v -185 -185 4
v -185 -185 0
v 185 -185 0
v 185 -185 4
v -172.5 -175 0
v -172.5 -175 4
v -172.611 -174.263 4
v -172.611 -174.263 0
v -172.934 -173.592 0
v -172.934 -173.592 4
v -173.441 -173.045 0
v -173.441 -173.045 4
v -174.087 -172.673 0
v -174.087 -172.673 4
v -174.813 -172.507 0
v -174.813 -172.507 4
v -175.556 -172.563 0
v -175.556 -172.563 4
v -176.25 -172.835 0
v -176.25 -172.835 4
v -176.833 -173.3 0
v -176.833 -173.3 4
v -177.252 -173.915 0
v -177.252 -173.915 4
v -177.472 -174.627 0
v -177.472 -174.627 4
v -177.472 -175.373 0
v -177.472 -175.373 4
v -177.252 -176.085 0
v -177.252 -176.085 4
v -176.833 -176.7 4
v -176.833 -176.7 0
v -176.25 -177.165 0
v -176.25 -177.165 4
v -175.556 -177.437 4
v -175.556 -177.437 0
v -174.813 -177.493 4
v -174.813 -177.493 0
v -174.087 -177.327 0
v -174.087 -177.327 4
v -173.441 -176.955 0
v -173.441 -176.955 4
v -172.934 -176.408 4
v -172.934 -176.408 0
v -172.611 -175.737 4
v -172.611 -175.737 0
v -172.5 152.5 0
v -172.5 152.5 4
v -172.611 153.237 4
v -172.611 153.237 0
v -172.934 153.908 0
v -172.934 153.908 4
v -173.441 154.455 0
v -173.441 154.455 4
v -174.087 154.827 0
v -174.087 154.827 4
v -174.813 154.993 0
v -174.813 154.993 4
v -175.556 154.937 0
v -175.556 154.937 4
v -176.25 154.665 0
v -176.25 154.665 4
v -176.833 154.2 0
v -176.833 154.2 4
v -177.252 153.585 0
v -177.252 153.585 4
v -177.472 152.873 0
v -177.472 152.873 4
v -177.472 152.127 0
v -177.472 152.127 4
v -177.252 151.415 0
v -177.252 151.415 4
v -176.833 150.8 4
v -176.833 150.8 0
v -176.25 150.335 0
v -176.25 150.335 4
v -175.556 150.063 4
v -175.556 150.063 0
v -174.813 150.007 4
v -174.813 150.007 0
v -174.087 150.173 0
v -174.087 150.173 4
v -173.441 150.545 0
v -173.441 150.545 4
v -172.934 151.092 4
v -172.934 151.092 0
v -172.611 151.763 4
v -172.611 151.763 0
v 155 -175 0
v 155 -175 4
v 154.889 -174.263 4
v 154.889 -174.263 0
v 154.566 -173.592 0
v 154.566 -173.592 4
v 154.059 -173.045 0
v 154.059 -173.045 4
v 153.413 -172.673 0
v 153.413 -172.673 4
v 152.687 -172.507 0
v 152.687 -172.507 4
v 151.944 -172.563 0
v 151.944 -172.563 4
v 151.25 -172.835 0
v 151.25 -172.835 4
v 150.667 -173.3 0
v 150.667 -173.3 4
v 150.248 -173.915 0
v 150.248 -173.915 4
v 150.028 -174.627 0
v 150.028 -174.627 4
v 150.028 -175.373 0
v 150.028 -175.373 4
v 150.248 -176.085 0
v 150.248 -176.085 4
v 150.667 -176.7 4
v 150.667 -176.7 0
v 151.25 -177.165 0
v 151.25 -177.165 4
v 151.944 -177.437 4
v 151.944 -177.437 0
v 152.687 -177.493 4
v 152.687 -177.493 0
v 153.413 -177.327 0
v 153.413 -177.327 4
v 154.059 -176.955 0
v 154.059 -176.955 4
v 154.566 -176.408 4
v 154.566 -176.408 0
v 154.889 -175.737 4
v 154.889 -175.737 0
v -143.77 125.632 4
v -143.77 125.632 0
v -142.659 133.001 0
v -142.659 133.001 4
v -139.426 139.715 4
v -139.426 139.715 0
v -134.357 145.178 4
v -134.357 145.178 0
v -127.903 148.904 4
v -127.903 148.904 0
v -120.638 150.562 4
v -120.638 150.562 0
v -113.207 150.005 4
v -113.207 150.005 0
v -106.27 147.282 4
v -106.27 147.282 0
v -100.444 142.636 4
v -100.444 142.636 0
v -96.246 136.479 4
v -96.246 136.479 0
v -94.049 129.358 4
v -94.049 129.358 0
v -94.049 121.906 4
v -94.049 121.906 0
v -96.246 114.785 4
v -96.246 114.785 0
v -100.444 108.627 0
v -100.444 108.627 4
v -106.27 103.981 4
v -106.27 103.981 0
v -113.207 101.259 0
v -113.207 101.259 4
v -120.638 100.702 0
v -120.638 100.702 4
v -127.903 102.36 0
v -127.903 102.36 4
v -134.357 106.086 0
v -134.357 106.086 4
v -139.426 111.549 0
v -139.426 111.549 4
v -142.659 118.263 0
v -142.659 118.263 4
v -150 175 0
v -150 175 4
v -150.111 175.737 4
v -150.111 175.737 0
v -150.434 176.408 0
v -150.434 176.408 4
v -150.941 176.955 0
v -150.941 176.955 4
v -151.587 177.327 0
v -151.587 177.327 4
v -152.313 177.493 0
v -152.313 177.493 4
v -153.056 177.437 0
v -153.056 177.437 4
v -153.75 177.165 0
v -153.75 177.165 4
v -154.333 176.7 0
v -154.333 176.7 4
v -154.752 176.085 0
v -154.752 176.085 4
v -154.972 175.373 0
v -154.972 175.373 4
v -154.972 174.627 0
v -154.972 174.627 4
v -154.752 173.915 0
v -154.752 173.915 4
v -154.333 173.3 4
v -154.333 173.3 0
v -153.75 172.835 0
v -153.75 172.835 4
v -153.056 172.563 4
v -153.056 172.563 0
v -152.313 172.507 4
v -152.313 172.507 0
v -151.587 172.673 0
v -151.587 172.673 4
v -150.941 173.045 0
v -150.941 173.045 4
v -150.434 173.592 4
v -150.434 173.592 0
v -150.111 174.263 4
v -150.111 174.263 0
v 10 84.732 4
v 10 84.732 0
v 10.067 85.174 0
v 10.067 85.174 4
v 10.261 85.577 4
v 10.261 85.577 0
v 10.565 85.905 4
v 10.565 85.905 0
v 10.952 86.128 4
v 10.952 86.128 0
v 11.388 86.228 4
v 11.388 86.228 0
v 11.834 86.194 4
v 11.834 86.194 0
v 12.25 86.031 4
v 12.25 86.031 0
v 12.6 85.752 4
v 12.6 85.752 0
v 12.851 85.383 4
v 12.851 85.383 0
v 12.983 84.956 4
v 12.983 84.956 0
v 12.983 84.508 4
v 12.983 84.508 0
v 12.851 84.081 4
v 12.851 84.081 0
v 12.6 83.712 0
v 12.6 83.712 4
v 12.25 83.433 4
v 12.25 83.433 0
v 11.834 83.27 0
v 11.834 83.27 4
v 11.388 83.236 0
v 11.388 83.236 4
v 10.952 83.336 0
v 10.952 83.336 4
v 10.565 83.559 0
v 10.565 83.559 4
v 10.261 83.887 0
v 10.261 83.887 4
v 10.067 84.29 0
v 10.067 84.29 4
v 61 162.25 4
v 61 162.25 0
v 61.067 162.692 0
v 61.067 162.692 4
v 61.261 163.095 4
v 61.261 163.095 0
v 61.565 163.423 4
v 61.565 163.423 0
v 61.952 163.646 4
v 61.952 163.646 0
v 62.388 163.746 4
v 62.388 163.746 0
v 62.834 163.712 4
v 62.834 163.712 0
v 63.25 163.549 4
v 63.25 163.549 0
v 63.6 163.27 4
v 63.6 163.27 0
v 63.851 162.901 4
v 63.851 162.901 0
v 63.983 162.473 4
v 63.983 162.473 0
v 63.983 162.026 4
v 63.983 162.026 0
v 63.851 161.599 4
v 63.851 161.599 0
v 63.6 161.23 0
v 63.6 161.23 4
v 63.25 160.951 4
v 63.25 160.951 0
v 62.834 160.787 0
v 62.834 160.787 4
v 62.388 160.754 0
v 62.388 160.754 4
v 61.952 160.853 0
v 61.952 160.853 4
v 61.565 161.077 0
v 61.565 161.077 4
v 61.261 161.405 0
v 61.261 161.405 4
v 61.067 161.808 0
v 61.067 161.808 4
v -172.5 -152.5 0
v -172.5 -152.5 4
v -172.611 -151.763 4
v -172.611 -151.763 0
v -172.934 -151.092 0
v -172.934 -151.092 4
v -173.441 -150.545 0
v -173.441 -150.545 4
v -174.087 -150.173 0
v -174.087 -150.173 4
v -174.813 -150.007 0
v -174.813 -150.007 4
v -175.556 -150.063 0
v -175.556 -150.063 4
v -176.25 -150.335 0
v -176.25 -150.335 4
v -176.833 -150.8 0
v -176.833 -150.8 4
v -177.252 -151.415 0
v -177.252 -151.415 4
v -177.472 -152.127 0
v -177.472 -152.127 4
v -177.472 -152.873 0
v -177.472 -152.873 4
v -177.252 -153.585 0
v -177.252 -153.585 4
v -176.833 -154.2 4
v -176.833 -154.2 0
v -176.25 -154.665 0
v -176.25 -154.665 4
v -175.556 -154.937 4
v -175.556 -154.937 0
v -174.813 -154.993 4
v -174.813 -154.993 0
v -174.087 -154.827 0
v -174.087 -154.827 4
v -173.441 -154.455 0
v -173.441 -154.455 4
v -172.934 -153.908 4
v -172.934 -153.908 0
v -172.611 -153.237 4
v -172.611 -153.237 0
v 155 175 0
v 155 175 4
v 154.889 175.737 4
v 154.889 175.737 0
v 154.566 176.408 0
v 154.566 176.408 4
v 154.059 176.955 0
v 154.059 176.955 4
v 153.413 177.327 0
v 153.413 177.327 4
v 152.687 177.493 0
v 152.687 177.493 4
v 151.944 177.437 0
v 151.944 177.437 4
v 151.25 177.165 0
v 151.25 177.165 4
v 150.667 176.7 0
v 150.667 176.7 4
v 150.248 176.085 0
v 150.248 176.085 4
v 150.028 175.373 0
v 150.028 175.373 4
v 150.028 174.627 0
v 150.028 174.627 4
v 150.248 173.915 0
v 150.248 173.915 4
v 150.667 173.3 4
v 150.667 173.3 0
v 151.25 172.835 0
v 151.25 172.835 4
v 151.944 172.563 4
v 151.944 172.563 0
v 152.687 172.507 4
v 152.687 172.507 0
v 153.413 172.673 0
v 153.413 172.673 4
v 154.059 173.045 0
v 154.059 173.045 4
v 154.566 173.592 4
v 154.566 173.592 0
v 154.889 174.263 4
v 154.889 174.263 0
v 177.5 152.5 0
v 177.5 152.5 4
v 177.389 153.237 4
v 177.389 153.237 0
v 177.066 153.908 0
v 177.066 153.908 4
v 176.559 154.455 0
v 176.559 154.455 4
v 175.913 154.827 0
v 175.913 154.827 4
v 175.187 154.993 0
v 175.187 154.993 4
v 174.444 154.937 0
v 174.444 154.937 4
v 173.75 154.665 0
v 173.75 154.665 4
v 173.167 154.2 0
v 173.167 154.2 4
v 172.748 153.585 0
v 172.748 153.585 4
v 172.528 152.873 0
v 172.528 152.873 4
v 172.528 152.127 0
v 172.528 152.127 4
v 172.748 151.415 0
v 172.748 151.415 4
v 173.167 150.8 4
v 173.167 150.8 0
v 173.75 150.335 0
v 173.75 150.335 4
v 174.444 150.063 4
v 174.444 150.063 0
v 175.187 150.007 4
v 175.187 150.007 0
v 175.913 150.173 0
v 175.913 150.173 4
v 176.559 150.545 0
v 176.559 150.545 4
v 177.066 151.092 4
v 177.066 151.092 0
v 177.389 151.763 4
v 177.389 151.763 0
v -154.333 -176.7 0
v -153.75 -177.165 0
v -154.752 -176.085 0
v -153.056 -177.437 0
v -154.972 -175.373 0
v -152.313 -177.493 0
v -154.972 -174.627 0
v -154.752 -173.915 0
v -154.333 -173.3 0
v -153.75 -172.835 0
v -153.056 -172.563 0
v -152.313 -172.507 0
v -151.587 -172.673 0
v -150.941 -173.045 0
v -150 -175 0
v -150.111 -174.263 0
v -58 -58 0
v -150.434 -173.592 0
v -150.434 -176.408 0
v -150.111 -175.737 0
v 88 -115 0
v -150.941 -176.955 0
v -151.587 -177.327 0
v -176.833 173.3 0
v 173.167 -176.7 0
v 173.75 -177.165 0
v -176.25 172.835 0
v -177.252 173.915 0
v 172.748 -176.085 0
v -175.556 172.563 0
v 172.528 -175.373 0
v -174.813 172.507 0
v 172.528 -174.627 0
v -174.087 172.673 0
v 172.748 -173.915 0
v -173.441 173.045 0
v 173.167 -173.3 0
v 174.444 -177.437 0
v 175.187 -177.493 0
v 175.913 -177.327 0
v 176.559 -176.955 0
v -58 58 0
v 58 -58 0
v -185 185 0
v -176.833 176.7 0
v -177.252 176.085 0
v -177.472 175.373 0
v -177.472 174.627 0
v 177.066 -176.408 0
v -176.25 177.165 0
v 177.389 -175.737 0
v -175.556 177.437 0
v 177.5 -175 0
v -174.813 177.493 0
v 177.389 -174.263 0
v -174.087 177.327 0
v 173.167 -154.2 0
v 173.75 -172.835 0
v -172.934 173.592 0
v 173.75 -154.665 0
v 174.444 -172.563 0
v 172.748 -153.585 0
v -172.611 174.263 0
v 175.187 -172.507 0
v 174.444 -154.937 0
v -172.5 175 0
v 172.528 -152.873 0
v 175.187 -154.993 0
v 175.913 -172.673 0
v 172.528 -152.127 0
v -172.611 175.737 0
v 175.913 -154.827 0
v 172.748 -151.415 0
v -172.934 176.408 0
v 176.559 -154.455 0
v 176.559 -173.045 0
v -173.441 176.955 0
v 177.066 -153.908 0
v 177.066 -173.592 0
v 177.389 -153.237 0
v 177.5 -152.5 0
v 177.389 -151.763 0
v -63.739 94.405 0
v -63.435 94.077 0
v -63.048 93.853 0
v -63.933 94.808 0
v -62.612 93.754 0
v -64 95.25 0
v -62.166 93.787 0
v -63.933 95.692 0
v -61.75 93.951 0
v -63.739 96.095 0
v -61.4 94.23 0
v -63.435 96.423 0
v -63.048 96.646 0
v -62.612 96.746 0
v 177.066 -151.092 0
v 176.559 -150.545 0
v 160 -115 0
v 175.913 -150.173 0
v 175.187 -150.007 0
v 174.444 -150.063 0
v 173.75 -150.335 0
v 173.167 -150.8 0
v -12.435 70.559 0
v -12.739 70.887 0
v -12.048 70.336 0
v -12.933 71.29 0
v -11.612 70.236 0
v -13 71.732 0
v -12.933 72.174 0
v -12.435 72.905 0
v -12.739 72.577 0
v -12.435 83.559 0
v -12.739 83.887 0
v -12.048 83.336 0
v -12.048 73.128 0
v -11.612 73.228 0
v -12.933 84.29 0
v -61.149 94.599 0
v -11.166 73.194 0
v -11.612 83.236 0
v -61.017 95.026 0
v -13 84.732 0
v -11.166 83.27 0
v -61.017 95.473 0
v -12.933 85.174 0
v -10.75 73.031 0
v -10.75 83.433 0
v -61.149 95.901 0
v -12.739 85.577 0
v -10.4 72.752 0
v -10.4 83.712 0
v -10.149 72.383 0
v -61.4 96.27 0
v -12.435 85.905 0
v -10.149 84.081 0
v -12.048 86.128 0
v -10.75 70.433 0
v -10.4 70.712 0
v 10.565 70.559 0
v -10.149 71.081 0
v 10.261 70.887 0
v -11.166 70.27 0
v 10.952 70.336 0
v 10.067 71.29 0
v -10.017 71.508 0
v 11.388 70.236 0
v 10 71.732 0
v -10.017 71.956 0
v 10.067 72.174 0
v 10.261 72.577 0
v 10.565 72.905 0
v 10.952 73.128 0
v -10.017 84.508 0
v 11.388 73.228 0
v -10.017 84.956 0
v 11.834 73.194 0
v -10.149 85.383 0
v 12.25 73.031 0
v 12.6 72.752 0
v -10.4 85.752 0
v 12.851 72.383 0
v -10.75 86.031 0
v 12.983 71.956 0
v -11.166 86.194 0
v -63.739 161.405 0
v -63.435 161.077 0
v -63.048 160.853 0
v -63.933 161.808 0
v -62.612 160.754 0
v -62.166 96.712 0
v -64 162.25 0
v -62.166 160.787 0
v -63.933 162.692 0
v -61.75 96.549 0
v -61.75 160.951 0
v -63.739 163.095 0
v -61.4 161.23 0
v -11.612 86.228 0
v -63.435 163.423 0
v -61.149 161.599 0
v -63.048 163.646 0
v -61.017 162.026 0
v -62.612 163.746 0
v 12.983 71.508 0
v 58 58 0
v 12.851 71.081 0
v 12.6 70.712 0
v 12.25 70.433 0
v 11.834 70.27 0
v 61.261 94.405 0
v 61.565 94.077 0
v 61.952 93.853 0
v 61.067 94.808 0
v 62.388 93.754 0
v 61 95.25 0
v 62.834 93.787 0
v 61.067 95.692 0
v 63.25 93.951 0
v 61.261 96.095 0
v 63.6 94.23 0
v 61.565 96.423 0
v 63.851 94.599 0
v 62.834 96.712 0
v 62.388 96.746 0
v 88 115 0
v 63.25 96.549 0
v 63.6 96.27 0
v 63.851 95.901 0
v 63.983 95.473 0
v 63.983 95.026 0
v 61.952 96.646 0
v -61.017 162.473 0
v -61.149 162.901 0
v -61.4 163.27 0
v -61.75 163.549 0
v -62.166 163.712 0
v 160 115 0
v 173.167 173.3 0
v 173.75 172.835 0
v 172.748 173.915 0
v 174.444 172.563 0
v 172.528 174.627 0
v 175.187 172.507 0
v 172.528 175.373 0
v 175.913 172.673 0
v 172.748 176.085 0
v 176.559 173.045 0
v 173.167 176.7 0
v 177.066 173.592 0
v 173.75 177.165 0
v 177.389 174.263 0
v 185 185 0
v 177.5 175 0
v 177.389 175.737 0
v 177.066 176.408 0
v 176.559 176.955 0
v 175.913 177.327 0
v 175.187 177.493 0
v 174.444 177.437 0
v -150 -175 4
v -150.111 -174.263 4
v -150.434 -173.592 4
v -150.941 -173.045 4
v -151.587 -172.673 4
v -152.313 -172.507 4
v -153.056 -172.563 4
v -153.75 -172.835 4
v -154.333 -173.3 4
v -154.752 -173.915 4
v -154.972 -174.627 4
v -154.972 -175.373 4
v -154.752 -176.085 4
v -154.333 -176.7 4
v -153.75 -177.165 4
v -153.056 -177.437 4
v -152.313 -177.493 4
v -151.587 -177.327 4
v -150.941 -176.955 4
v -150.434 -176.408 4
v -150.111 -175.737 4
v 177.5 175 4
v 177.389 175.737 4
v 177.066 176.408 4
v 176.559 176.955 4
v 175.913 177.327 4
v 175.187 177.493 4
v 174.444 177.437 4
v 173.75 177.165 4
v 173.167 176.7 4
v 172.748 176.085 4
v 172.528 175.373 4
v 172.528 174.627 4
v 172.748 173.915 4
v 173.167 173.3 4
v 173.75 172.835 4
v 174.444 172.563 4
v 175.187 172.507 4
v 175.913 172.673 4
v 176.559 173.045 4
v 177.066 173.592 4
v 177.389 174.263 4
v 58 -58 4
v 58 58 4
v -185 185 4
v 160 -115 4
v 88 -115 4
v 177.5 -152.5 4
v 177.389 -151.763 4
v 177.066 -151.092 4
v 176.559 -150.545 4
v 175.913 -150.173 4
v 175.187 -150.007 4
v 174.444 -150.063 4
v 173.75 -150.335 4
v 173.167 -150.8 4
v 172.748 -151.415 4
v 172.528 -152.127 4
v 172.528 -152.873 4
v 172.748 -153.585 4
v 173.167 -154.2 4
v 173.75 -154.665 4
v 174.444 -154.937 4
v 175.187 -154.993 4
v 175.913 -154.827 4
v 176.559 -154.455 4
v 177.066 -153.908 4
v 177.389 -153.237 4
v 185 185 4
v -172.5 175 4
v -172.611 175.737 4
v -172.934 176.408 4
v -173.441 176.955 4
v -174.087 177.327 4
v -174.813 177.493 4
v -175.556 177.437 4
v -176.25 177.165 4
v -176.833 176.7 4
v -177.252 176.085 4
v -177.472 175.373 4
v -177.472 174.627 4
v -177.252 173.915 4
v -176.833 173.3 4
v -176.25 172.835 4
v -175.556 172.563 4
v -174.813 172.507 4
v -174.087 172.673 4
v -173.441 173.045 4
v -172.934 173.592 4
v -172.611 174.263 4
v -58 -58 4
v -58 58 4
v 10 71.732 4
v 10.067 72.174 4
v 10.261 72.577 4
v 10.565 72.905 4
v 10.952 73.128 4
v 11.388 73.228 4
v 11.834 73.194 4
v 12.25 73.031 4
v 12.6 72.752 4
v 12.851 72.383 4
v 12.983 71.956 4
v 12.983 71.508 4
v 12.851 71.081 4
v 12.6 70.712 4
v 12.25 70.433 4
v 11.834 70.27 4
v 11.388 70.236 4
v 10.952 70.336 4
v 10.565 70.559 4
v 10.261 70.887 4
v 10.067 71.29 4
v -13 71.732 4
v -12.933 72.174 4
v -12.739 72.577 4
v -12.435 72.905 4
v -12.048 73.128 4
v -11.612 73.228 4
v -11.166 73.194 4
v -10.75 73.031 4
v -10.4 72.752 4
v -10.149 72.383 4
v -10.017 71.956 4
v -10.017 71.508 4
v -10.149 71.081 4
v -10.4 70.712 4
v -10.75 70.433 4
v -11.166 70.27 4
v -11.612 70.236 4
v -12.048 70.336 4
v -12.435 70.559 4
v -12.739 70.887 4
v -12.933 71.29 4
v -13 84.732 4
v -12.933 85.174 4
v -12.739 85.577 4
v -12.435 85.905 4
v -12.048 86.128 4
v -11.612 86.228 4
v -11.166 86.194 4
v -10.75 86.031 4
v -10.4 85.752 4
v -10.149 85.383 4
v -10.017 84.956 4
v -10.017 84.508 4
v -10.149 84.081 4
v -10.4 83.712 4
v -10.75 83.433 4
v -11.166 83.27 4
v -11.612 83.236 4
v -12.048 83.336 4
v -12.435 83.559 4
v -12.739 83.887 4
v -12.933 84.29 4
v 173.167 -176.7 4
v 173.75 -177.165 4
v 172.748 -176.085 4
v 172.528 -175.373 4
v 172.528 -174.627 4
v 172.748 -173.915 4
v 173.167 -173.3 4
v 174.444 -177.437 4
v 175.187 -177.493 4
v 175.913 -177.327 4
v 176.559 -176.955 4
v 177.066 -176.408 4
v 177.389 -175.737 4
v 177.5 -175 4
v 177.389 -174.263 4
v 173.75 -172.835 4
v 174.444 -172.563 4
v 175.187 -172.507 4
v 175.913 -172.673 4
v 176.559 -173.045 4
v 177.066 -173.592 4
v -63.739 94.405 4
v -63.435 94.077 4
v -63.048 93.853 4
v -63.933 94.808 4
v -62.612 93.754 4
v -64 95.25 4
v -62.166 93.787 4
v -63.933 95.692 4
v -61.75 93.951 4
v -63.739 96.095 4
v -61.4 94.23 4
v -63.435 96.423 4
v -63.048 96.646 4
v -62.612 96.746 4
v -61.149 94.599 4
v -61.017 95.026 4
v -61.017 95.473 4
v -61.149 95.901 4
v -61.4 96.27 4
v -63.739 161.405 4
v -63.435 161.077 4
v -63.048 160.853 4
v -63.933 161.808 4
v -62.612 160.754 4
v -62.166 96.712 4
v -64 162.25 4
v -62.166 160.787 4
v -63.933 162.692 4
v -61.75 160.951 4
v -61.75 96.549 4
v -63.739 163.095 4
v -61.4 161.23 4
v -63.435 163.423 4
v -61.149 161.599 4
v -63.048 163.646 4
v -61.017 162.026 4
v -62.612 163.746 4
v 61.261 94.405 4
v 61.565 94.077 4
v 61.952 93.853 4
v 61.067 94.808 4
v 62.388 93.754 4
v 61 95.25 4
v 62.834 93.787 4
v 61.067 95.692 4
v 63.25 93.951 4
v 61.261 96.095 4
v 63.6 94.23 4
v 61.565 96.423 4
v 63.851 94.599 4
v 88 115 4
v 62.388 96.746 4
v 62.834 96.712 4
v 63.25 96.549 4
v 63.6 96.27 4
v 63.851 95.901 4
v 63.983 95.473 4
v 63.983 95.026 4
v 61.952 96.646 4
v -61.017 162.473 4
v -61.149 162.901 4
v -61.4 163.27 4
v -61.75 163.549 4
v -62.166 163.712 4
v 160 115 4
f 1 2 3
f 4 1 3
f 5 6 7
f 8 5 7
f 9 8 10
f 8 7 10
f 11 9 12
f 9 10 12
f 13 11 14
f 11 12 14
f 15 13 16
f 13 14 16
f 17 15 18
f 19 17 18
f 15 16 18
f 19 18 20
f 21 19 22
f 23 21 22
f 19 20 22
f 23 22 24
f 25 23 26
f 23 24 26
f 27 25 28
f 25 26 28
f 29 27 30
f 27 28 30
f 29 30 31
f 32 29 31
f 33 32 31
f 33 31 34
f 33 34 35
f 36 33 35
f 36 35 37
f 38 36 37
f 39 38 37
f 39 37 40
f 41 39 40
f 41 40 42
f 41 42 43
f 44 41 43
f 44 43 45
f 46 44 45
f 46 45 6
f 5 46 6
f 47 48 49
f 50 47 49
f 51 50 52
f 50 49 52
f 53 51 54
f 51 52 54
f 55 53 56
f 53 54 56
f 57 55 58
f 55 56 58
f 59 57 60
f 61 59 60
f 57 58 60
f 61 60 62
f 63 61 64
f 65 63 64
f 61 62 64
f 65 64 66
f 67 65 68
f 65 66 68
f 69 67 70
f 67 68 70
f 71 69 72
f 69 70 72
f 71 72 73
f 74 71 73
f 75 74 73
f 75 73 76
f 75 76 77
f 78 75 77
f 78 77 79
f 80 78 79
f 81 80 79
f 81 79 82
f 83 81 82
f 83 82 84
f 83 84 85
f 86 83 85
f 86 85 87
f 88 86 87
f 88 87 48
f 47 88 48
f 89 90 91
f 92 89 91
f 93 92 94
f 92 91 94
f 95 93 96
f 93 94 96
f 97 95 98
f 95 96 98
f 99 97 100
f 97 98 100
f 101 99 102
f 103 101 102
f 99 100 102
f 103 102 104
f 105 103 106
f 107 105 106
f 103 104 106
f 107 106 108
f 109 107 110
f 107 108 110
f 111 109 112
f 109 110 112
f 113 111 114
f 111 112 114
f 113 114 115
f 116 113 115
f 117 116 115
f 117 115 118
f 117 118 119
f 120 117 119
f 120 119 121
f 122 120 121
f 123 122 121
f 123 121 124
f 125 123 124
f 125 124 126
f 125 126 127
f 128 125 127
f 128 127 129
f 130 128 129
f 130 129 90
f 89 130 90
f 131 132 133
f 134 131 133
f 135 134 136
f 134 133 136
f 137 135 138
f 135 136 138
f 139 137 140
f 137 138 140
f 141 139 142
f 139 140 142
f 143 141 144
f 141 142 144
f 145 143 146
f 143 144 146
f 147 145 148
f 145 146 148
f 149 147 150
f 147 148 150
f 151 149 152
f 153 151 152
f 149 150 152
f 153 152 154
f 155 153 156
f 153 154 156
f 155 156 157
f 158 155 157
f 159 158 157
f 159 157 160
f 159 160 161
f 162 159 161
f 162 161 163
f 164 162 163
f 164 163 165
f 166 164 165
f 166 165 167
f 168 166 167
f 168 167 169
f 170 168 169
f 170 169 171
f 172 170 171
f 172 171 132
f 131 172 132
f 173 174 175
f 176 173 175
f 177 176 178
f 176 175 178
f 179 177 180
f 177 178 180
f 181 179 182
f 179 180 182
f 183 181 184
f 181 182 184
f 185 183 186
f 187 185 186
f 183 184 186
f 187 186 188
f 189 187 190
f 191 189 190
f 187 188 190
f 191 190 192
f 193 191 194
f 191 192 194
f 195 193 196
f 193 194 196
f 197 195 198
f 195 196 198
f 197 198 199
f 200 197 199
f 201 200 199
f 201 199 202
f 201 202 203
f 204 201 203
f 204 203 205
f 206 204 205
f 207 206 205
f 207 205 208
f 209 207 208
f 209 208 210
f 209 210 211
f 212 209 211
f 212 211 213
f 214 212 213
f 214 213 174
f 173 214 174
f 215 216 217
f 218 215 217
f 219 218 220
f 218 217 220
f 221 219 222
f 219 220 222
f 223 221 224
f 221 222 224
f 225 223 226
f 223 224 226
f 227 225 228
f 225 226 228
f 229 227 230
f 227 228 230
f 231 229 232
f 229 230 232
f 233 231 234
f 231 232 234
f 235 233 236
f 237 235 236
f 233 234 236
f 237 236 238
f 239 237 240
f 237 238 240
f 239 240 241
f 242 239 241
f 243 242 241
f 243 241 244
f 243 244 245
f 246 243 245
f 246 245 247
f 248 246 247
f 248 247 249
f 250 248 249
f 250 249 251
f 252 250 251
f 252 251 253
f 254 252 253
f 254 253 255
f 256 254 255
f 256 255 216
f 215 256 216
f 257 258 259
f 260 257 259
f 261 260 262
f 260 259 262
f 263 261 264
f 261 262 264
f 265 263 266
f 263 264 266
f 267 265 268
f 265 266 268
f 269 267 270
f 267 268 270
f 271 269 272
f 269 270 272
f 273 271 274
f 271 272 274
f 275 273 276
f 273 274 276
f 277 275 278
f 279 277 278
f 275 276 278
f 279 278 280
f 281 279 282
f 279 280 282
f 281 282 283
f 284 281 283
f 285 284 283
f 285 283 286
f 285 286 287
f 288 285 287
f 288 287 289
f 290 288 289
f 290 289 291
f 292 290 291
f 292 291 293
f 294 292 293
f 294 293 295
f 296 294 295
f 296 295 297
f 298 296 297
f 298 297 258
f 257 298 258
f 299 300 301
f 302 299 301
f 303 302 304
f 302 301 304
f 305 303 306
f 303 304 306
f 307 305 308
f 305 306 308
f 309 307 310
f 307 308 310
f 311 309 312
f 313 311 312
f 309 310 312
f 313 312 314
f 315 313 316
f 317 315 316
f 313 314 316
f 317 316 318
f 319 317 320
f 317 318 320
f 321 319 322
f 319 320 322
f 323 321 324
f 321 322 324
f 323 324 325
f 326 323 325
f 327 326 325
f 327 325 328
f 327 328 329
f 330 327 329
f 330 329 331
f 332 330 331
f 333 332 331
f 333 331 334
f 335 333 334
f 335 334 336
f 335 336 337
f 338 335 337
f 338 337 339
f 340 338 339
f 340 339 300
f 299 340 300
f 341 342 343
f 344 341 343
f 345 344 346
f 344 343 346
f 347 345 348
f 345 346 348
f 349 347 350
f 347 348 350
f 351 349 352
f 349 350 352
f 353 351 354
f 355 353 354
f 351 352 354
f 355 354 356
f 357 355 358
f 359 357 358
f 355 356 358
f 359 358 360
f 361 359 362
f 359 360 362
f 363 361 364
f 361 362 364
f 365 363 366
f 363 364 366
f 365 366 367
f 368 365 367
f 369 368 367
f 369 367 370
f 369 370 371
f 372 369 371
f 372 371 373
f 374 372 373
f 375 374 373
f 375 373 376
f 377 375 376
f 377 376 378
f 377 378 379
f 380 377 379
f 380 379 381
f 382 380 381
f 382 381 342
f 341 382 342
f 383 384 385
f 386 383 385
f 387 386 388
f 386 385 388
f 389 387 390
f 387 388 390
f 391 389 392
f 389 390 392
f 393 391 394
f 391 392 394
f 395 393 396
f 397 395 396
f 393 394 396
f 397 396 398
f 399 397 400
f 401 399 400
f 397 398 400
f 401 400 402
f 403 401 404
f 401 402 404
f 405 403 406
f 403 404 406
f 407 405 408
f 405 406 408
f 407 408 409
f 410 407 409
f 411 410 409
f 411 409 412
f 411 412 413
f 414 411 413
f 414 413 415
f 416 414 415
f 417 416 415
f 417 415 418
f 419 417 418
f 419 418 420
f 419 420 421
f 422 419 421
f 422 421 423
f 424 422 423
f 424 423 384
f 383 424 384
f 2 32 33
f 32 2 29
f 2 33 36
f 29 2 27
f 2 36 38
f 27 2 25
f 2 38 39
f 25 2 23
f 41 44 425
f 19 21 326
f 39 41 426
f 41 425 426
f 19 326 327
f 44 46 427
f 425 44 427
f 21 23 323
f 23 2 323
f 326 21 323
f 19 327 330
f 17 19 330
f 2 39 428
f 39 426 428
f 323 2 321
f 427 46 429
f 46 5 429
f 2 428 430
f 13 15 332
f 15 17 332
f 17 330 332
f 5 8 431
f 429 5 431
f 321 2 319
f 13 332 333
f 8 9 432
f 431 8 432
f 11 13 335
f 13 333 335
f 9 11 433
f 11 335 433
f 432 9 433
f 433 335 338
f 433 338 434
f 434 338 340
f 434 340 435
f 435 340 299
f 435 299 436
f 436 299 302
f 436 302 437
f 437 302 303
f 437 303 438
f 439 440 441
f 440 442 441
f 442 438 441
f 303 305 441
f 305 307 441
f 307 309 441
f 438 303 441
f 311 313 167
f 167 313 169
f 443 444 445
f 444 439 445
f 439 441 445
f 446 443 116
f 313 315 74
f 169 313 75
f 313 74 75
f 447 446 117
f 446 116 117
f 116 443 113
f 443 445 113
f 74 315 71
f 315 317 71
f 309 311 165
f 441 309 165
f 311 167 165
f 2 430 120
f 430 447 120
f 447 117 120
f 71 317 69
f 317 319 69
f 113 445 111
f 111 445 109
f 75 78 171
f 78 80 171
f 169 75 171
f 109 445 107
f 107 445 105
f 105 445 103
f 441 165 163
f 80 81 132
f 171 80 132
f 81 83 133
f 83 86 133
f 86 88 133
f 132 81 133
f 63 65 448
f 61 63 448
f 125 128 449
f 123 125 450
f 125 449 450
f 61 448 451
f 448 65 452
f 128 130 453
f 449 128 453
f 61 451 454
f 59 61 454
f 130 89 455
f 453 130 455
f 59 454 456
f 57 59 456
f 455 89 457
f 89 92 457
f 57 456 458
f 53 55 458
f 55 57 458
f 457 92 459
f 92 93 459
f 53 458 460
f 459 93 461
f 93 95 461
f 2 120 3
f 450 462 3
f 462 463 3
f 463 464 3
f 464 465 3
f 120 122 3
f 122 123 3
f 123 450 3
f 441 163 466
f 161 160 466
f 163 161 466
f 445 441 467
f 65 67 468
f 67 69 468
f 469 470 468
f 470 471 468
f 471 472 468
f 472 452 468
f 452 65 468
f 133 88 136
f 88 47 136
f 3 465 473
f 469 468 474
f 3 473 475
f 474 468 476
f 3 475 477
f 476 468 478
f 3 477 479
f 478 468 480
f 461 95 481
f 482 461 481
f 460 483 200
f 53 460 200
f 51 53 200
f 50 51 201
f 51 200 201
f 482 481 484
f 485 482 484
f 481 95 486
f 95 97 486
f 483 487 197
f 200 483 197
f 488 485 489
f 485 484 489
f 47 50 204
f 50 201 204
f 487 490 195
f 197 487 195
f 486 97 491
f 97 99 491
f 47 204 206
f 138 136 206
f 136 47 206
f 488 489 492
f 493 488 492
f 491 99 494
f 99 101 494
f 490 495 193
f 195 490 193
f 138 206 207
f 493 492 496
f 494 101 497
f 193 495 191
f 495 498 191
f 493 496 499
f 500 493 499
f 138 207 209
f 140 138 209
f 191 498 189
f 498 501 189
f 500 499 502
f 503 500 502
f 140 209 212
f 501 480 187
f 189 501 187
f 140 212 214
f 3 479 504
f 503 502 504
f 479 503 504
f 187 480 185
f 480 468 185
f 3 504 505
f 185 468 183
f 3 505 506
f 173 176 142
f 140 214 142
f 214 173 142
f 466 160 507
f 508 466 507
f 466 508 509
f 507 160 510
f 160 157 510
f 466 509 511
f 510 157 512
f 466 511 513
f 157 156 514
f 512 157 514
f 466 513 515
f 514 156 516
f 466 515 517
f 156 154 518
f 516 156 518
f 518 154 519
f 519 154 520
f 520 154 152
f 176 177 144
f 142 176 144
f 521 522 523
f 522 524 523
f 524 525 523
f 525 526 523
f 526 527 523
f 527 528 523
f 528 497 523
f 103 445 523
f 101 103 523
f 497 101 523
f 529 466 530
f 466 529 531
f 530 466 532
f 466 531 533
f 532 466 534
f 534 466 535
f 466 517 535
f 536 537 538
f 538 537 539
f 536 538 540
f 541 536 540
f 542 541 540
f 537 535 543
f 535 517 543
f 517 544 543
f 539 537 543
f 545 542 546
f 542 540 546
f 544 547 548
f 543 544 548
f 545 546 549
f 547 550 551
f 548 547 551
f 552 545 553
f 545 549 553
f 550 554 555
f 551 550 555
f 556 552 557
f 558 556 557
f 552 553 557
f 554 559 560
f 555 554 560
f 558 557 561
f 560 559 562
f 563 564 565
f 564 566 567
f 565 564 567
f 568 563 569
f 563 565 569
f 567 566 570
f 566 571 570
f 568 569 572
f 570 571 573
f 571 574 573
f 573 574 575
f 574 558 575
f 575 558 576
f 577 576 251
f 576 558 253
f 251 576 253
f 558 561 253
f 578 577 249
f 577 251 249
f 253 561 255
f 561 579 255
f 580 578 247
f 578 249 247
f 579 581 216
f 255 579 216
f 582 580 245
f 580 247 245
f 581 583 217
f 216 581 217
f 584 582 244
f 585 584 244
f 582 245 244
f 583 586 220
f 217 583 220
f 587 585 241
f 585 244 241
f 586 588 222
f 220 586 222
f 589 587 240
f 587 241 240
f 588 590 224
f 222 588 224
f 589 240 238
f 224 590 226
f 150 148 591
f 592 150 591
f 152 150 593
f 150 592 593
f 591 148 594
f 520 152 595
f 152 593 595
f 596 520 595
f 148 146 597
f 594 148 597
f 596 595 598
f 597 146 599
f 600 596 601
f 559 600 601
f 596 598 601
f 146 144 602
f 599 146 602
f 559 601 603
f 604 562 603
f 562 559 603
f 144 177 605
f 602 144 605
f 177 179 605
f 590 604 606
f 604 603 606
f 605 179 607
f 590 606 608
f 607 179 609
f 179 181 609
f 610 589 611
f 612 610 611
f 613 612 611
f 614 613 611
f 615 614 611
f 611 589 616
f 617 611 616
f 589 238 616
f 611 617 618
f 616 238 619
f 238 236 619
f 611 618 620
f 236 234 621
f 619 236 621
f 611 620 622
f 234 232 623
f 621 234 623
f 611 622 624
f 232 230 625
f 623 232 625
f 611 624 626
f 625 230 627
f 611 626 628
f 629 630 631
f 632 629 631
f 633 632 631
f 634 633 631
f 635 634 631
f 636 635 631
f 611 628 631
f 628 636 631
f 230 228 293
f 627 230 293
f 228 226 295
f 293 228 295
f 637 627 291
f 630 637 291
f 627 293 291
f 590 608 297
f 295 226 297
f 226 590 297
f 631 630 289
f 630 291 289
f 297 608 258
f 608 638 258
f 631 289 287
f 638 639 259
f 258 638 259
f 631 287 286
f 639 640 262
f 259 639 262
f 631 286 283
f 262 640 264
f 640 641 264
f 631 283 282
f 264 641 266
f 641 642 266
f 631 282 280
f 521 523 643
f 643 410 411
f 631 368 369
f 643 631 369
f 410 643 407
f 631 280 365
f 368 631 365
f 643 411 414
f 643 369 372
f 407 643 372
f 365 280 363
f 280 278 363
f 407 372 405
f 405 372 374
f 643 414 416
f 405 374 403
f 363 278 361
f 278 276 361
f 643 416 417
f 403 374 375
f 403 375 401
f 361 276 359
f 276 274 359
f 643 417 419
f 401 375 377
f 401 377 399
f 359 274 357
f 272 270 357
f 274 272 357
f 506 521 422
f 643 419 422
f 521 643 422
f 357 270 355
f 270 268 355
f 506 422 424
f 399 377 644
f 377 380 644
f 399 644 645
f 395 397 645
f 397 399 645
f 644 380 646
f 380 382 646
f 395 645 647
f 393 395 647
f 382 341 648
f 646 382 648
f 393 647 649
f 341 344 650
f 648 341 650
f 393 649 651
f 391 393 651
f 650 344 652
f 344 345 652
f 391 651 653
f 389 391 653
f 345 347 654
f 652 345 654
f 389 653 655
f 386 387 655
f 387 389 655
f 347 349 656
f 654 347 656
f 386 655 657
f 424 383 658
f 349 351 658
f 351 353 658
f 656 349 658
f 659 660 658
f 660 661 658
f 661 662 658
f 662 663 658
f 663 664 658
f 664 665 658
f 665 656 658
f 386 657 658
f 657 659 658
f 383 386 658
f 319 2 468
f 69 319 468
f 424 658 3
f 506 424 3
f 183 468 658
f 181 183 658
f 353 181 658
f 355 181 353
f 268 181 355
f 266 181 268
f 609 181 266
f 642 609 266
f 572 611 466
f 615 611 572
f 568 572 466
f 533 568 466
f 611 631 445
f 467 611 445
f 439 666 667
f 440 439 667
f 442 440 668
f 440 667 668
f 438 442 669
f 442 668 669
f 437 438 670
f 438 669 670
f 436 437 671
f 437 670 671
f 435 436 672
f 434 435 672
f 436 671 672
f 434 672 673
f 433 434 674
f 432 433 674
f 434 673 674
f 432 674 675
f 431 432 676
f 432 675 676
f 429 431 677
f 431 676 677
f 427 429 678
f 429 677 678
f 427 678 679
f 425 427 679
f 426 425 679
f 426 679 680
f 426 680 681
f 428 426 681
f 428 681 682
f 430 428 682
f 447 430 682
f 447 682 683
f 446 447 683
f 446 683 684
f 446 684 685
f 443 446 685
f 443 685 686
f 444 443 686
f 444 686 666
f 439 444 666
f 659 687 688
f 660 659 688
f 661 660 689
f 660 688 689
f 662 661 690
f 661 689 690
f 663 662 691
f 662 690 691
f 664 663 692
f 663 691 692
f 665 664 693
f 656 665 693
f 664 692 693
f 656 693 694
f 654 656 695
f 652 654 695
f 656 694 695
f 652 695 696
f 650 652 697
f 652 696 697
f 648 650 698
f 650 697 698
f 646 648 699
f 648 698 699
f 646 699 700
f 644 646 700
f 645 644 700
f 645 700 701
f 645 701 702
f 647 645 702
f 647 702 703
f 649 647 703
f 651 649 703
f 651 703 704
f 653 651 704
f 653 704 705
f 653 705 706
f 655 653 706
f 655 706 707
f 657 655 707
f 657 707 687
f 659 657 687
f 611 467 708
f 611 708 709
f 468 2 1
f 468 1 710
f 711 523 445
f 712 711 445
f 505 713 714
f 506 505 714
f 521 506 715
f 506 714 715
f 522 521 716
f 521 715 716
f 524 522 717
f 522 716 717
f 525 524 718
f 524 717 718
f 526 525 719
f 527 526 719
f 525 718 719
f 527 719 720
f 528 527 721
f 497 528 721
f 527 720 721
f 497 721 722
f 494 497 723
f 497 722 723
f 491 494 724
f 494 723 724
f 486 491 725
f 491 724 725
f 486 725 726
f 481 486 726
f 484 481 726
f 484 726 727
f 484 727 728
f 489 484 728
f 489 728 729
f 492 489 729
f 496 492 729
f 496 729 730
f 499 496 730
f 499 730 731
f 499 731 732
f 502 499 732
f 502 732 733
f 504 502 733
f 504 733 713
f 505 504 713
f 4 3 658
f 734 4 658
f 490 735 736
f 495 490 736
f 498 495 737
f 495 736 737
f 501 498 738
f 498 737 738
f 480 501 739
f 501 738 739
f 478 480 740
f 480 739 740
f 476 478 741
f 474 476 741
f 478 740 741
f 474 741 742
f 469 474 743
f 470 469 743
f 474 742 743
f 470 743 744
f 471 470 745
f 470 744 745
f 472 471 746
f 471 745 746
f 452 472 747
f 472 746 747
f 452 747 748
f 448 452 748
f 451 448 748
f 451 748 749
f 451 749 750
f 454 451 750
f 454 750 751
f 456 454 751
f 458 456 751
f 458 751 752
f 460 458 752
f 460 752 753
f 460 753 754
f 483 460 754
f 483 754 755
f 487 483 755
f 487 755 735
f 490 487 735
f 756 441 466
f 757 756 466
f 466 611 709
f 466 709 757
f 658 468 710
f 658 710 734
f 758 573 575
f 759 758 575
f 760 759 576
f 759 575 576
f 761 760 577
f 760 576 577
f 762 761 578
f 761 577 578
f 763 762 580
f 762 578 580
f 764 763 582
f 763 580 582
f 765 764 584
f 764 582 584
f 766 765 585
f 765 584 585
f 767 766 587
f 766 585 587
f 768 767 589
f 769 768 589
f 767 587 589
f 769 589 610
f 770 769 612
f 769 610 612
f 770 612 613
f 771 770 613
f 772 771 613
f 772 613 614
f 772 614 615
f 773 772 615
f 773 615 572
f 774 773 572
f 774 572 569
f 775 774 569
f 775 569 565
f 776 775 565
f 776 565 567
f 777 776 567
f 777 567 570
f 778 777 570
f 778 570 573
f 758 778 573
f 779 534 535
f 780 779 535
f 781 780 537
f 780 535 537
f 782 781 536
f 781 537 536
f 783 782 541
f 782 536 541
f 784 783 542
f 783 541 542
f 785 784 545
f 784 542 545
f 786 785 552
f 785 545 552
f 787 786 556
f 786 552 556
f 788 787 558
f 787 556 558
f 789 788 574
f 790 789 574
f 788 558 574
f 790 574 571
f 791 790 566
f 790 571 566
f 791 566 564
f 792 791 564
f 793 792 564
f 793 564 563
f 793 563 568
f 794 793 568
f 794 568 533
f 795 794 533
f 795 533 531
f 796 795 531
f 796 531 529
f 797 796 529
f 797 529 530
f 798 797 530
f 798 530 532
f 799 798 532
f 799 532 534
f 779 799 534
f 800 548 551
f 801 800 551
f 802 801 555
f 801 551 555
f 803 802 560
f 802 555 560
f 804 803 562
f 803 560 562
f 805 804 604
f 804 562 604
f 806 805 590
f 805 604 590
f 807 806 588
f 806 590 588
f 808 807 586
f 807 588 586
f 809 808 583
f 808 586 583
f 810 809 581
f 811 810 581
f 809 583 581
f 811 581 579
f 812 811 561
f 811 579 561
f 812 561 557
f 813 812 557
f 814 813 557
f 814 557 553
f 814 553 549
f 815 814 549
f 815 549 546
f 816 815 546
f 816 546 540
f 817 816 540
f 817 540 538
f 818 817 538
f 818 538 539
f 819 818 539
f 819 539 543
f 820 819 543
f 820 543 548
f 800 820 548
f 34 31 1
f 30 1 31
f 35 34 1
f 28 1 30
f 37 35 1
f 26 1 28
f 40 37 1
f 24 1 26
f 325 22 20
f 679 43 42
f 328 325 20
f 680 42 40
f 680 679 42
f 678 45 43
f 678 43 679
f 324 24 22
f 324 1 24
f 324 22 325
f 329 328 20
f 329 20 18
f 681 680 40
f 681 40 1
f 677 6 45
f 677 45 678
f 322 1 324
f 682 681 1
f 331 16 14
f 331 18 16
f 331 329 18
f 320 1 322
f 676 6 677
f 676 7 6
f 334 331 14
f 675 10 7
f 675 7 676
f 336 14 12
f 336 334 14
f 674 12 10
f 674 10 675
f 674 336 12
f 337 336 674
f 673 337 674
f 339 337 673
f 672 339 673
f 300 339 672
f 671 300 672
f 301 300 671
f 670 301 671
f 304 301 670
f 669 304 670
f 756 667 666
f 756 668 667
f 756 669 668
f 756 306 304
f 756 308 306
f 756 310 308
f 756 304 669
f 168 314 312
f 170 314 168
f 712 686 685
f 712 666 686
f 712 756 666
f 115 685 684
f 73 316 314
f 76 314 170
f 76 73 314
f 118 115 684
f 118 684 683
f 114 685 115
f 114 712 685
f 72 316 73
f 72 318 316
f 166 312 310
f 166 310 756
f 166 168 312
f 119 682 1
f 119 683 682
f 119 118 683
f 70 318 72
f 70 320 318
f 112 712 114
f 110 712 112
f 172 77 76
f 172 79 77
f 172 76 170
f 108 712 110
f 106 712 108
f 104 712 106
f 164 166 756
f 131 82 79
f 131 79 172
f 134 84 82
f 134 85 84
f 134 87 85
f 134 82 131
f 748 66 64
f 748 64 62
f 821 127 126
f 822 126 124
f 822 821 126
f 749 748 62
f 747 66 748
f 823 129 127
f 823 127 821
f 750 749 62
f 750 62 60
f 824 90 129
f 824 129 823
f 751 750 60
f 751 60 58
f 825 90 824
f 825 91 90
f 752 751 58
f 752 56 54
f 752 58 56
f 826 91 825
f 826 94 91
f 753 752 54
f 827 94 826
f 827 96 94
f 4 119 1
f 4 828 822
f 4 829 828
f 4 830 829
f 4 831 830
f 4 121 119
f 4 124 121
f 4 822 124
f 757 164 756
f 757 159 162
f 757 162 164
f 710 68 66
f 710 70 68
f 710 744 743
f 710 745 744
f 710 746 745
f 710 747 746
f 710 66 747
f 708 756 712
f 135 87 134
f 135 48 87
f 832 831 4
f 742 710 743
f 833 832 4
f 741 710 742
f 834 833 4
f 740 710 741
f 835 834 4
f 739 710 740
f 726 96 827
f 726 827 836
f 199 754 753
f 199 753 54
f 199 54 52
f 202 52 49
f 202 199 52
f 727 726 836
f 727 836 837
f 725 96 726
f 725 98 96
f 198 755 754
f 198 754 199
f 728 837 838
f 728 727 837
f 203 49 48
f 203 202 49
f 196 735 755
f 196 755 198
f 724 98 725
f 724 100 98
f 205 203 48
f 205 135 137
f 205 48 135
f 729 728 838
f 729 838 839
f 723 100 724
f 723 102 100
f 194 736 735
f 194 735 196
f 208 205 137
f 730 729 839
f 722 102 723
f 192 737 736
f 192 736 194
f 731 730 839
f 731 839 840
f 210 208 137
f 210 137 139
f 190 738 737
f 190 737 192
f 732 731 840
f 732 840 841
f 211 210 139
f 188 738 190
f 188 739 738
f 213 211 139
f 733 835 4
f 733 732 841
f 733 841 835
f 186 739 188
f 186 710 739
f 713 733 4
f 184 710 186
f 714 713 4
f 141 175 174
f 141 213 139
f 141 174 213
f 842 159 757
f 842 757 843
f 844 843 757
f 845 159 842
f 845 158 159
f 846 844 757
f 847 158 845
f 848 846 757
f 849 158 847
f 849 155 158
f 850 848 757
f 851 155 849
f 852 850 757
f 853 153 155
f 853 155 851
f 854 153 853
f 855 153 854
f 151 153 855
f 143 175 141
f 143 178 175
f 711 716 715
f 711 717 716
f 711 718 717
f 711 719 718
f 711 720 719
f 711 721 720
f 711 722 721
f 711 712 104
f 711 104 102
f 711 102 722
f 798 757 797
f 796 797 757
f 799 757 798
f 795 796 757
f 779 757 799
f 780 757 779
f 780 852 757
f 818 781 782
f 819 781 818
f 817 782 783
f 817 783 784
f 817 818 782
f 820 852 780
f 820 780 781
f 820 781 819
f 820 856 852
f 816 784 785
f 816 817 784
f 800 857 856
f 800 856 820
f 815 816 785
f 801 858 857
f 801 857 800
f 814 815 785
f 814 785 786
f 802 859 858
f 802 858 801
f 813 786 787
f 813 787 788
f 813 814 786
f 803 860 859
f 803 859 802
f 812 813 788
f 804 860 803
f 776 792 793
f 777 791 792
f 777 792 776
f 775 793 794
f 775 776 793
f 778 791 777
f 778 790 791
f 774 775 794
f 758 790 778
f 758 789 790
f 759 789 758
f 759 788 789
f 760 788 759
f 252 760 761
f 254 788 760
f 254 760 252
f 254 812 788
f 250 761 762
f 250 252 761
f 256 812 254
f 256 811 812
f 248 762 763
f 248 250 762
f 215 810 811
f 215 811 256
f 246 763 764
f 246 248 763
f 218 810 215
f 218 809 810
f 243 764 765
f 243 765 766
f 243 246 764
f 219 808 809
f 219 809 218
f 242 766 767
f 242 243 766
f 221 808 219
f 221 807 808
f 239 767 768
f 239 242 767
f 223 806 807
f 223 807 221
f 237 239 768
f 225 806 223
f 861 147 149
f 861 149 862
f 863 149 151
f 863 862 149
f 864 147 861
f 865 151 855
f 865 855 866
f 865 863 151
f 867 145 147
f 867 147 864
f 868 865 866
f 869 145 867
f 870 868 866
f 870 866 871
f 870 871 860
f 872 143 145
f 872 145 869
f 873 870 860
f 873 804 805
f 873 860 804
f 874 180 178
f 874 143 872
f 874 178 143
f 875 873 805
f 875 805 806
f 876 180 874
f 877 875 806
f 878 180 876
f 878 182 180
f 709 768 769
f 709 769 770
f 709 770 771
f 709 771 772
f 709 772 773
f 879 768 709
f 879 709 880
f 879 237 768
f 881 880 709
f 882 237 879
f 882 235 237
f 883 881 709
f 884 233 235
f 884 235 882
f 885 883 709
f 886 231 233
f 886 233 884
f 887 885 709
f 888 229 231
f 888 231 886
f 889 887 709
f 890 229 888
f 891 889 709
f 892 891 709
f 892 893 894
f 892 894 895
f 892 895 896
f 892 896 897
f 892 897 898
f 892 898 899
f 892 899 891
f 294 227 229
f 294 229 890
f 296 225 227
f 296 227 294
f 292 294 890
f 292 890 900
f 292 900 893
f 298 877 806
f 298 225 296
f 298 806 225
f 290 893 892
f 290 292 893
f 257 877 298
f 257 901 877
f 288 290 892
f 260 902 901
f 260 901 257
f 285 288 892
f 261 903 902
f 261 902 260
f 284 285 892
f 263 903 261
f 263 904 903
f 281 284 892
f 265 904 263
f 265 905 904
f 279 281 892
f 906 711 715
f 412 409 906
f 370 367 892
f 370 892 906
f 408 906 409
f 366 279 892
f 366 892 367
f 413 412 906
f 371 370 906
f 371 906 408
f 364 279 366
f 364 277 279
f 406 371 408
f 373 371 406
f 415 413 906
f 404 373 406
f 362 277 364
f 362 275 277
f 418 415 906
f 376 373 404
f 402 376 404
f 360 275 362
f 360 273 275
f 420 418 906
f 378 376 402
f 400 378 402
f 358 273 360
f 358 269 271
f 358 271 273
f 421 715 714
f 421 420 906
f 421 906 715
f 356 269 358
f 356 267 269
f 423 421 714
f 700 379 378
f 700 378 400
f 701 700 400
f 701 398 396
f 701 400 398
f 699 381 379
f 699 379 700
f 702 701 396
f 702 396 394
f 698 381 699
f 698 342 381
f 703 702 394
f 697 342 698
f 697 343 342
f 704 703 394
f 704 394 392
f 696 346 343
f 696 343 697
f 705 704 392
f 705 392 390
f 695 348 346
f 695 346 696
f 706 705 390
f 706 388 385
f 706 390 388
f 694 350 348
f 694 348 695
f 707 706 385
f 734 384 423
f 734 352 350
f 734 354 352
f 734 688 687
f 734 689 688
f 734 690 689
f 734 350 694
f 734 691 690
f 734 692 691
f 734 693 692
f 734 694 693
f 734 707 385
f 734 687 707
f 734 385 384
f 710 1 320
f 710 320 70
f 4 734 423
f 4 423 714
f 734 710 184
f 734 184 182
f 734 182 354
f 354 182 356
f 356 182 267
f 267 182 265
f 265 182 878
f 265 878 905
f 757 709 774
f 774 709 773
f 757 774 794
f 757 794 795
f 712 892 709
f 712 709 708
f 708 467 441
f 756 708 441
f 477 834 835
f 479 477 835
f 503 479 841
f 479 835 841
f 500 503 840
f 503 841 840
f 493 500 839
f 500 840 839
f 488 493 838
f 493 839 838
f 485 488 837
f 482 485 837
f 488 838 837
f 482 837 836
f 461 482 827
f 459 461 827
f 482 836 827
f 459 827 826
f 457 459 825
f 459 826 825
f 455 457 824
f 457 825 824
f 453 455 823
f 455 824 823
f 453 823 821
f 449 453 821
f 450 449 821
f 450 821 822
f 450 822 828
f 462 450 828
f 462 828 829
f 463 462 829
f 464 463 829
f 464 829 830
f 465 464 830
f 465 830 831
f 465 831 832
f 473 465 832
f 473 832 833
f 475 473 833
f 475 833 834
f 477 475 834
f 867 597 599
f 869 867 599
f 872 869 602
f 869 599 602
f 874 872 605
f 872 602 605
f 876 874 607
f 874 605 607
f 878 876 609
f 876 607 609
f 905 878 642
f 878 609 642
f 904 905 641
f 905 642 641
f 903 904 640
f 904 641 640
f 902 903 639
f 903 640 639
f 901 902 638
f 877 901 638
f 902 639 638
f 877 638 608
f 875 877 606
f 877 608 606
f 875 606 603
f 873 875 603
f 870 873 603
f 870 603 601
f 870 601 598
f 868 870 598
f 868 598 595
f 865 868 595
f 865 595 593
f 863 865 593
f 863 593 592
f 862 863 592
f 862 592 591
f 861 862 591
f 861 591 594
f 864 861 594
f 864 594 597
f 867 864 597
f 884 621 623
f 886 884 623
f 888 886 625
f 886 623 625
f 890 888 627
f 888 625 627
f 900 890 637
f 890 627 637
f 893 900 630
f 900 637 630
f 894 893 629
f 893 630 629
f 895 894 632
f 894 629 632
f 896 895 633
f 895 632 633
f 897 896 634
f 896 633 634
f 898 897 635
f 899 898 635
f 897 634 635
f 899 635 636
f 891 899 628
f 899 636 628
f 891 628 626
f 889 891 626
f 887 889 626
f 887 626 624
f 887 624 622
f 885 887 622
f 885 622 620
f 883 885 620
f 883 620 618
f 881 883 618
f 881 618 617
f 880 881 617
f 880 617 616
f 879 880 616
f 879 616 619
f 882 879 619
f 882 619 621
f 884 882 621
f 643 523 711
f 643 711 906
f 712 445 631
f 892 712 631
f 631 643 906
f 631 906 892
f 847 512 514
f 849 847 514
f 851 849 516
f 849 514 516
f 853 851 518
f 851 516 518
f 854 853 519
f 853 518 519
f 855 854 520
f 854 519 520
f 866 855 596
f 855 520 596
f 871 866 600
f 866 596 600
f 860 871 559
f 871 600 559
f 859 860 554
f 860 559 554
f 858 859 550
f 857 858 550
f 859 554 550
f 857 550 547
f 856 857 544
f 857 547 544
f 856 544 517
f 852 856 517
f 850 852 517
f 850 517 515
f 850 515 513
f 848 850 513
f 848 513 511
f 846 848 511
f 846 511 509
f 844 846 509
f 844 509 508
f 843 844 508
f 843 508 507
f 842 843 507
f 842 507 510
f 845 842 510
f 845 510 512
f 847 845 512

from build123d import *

# Parameters (mm, degrees)
SKETCH_1_W           = 370
SKETCH_1_H           = 370
EXTRUDE_1_DEPTH      = 4
SKETCH_2_R           = 2.5
CUT_EXTRUDE_1_DEPTH  = 262.660084843
SKETCH_6_R           = 1.5
CUT_EXTRUDE_7_DEPTH  = 262.660084843
SKETCH_7_R           = 25
CUT_EXTRUDE_8_DEPTH  = 262.660084843
SKETCH_8_W           = 116
SKETCH_8_H           = 116
CUT_EXTRUDE_9_DEPTH  = 10
SKETCH_11_W          = 72
SKETCH_11_H          = 230
CUT_EXTRUDE_11_DEPTH = 5
SKETCH_12_R          = 1.5
CUT_EXTRUDE_12_DEPTH = 262.660084843


with BuildPart() as part:
    # 草图1 → 凸台-拉伸1 (new body)
    with BuildSketch(Plane.XY):
        Rectangle(SKETCH_1_W, SKETCH_1_H)
    extrude(amount=EXTRUDE_1_DEPTH)

    # 草图2 → 切除-拉伸1 (cut, through all)
    with BuildSketch(Plane.XY.offset(4)):
        with Locations((-175, -175)):
            Circle(SKETCH_2_R)
        with Locations((-152.5, -175)):
            Circle(SKETCH_2_R)
        with Locations((-175, -152.5)):
            Circle(SKETCH_2_R)
        with Locations((-152.5, 175)):
            Circle(SKETCH_2_R)
        with Locations((-175, 152.5)):
            Circle(SKETCH_2_R)
        with Locations((-175, 175)):
            Circle(SKETCH_2_R)
        with Locations((175, 152.5)):
            Circle(SKETCH_2_R)
        with Locations((152.5, 175)):
            Circle(SKETCH_2_R)
        with Locations((175, 175)):
            Circle(SKETCH_2_R)
        with Locations((152.5, -175)):
            Circle(SKETCH_2_R)
        with Locations((175, -152.5)):
            Circle(SKETCH_2_R)
        with Locations((175, -175)):
            Circle(SKETCH_2_R)
    extrude(amount=-CUT_EXTRUDE_1_DEPTH, mode=Mode.SUBTRACT)

    # 草图6 → 切除-拉伸7 (cut, through all)
    with BuildSketch(Plane(origin=(0, 0, 0), x_dir=(-1, 0, 0), z_dir=(0, 0, -1))):
        with Locations((-62.5, 162.249795252)):
            Circle(SKETCH_6_R)
        with Locations((-62.5, 95.249795252)):
            Circle(SKETCH_6_R)
        with Locations((62.5, 95.249795252)):
            Circle(SKETCH_6_R)
        with Locations((62.5, 162.249795252)):
            Circle(SKETCH_6_R)
    extrude(amount=-CUT_EXTRUDE_7_DEPTH, mode=Mode.SUBTRACT)

    # 草图7 → 切除-拉伸8 (cut, through all)
    with BuildSketch(Plane(origin=(0, 0, 0), x_dir=(-1, 0, 0), z_dir=(0, 0, -1))):
        with Locations((118.769854949, 125.631801741)):
            Circle(SKETCH_7_R)
    extrude(amount=-CUT_EXTRUDE_8_DEPTH, mode=Mode.SUBTRACT)

    # 草图8 → 切除-拉伸9 (cut)
    with BuildSketch(Plane(origin=(0, 0, 0), x_dir=(-1, 0, 0), z_dir=(0, 0, -1))):
        Rectangle(SKETCH_8_W, SKETCH_8_H)
    extrude(amount=-CUT_EXTRUDE_9_DEPTH, mode=Mode.SUBTRACT)

    # 草图11 → 切除-拉伸11 (cut)
    with BuildSketch(Plane(origin=(0, 0, 0), x_dir=(-1, 0, 0), z_dir=(0, 0, -1))):
        with Locations((-124, 0)):
            Rectangle(SKETCH_11_W, SKETCH_11_H)
    extrude(amount=-CUT_EXTRUDE_11_DEPTH, mode=Mode.SUBTRACT)

    # 草图12 → 切除-拉伸12 (cut, through all)
    with BuildSketch(Plane(origin=(0, 0, 0), x_dir=(-1, 0, 0), z_dir=(0, 0, -1))):
        with Locations((-11.5, 71.732050808)):
            Circle(SKETCH_12_R)
        with Locations((11.5, 71.732050808)):
            Circle(SKETCH_12_R)
        with Locations((-11.5, 84.732050808)):
            Circle(SKETCH_12_R)
        with Locations((11.5, 84.732050808)):
            Circle(SKETCH_12_R)
    extrude(amount=-CUT_EXTRUDE_12_DEPTH, mode=Mode.SUBTRACT)


solid = part.part
